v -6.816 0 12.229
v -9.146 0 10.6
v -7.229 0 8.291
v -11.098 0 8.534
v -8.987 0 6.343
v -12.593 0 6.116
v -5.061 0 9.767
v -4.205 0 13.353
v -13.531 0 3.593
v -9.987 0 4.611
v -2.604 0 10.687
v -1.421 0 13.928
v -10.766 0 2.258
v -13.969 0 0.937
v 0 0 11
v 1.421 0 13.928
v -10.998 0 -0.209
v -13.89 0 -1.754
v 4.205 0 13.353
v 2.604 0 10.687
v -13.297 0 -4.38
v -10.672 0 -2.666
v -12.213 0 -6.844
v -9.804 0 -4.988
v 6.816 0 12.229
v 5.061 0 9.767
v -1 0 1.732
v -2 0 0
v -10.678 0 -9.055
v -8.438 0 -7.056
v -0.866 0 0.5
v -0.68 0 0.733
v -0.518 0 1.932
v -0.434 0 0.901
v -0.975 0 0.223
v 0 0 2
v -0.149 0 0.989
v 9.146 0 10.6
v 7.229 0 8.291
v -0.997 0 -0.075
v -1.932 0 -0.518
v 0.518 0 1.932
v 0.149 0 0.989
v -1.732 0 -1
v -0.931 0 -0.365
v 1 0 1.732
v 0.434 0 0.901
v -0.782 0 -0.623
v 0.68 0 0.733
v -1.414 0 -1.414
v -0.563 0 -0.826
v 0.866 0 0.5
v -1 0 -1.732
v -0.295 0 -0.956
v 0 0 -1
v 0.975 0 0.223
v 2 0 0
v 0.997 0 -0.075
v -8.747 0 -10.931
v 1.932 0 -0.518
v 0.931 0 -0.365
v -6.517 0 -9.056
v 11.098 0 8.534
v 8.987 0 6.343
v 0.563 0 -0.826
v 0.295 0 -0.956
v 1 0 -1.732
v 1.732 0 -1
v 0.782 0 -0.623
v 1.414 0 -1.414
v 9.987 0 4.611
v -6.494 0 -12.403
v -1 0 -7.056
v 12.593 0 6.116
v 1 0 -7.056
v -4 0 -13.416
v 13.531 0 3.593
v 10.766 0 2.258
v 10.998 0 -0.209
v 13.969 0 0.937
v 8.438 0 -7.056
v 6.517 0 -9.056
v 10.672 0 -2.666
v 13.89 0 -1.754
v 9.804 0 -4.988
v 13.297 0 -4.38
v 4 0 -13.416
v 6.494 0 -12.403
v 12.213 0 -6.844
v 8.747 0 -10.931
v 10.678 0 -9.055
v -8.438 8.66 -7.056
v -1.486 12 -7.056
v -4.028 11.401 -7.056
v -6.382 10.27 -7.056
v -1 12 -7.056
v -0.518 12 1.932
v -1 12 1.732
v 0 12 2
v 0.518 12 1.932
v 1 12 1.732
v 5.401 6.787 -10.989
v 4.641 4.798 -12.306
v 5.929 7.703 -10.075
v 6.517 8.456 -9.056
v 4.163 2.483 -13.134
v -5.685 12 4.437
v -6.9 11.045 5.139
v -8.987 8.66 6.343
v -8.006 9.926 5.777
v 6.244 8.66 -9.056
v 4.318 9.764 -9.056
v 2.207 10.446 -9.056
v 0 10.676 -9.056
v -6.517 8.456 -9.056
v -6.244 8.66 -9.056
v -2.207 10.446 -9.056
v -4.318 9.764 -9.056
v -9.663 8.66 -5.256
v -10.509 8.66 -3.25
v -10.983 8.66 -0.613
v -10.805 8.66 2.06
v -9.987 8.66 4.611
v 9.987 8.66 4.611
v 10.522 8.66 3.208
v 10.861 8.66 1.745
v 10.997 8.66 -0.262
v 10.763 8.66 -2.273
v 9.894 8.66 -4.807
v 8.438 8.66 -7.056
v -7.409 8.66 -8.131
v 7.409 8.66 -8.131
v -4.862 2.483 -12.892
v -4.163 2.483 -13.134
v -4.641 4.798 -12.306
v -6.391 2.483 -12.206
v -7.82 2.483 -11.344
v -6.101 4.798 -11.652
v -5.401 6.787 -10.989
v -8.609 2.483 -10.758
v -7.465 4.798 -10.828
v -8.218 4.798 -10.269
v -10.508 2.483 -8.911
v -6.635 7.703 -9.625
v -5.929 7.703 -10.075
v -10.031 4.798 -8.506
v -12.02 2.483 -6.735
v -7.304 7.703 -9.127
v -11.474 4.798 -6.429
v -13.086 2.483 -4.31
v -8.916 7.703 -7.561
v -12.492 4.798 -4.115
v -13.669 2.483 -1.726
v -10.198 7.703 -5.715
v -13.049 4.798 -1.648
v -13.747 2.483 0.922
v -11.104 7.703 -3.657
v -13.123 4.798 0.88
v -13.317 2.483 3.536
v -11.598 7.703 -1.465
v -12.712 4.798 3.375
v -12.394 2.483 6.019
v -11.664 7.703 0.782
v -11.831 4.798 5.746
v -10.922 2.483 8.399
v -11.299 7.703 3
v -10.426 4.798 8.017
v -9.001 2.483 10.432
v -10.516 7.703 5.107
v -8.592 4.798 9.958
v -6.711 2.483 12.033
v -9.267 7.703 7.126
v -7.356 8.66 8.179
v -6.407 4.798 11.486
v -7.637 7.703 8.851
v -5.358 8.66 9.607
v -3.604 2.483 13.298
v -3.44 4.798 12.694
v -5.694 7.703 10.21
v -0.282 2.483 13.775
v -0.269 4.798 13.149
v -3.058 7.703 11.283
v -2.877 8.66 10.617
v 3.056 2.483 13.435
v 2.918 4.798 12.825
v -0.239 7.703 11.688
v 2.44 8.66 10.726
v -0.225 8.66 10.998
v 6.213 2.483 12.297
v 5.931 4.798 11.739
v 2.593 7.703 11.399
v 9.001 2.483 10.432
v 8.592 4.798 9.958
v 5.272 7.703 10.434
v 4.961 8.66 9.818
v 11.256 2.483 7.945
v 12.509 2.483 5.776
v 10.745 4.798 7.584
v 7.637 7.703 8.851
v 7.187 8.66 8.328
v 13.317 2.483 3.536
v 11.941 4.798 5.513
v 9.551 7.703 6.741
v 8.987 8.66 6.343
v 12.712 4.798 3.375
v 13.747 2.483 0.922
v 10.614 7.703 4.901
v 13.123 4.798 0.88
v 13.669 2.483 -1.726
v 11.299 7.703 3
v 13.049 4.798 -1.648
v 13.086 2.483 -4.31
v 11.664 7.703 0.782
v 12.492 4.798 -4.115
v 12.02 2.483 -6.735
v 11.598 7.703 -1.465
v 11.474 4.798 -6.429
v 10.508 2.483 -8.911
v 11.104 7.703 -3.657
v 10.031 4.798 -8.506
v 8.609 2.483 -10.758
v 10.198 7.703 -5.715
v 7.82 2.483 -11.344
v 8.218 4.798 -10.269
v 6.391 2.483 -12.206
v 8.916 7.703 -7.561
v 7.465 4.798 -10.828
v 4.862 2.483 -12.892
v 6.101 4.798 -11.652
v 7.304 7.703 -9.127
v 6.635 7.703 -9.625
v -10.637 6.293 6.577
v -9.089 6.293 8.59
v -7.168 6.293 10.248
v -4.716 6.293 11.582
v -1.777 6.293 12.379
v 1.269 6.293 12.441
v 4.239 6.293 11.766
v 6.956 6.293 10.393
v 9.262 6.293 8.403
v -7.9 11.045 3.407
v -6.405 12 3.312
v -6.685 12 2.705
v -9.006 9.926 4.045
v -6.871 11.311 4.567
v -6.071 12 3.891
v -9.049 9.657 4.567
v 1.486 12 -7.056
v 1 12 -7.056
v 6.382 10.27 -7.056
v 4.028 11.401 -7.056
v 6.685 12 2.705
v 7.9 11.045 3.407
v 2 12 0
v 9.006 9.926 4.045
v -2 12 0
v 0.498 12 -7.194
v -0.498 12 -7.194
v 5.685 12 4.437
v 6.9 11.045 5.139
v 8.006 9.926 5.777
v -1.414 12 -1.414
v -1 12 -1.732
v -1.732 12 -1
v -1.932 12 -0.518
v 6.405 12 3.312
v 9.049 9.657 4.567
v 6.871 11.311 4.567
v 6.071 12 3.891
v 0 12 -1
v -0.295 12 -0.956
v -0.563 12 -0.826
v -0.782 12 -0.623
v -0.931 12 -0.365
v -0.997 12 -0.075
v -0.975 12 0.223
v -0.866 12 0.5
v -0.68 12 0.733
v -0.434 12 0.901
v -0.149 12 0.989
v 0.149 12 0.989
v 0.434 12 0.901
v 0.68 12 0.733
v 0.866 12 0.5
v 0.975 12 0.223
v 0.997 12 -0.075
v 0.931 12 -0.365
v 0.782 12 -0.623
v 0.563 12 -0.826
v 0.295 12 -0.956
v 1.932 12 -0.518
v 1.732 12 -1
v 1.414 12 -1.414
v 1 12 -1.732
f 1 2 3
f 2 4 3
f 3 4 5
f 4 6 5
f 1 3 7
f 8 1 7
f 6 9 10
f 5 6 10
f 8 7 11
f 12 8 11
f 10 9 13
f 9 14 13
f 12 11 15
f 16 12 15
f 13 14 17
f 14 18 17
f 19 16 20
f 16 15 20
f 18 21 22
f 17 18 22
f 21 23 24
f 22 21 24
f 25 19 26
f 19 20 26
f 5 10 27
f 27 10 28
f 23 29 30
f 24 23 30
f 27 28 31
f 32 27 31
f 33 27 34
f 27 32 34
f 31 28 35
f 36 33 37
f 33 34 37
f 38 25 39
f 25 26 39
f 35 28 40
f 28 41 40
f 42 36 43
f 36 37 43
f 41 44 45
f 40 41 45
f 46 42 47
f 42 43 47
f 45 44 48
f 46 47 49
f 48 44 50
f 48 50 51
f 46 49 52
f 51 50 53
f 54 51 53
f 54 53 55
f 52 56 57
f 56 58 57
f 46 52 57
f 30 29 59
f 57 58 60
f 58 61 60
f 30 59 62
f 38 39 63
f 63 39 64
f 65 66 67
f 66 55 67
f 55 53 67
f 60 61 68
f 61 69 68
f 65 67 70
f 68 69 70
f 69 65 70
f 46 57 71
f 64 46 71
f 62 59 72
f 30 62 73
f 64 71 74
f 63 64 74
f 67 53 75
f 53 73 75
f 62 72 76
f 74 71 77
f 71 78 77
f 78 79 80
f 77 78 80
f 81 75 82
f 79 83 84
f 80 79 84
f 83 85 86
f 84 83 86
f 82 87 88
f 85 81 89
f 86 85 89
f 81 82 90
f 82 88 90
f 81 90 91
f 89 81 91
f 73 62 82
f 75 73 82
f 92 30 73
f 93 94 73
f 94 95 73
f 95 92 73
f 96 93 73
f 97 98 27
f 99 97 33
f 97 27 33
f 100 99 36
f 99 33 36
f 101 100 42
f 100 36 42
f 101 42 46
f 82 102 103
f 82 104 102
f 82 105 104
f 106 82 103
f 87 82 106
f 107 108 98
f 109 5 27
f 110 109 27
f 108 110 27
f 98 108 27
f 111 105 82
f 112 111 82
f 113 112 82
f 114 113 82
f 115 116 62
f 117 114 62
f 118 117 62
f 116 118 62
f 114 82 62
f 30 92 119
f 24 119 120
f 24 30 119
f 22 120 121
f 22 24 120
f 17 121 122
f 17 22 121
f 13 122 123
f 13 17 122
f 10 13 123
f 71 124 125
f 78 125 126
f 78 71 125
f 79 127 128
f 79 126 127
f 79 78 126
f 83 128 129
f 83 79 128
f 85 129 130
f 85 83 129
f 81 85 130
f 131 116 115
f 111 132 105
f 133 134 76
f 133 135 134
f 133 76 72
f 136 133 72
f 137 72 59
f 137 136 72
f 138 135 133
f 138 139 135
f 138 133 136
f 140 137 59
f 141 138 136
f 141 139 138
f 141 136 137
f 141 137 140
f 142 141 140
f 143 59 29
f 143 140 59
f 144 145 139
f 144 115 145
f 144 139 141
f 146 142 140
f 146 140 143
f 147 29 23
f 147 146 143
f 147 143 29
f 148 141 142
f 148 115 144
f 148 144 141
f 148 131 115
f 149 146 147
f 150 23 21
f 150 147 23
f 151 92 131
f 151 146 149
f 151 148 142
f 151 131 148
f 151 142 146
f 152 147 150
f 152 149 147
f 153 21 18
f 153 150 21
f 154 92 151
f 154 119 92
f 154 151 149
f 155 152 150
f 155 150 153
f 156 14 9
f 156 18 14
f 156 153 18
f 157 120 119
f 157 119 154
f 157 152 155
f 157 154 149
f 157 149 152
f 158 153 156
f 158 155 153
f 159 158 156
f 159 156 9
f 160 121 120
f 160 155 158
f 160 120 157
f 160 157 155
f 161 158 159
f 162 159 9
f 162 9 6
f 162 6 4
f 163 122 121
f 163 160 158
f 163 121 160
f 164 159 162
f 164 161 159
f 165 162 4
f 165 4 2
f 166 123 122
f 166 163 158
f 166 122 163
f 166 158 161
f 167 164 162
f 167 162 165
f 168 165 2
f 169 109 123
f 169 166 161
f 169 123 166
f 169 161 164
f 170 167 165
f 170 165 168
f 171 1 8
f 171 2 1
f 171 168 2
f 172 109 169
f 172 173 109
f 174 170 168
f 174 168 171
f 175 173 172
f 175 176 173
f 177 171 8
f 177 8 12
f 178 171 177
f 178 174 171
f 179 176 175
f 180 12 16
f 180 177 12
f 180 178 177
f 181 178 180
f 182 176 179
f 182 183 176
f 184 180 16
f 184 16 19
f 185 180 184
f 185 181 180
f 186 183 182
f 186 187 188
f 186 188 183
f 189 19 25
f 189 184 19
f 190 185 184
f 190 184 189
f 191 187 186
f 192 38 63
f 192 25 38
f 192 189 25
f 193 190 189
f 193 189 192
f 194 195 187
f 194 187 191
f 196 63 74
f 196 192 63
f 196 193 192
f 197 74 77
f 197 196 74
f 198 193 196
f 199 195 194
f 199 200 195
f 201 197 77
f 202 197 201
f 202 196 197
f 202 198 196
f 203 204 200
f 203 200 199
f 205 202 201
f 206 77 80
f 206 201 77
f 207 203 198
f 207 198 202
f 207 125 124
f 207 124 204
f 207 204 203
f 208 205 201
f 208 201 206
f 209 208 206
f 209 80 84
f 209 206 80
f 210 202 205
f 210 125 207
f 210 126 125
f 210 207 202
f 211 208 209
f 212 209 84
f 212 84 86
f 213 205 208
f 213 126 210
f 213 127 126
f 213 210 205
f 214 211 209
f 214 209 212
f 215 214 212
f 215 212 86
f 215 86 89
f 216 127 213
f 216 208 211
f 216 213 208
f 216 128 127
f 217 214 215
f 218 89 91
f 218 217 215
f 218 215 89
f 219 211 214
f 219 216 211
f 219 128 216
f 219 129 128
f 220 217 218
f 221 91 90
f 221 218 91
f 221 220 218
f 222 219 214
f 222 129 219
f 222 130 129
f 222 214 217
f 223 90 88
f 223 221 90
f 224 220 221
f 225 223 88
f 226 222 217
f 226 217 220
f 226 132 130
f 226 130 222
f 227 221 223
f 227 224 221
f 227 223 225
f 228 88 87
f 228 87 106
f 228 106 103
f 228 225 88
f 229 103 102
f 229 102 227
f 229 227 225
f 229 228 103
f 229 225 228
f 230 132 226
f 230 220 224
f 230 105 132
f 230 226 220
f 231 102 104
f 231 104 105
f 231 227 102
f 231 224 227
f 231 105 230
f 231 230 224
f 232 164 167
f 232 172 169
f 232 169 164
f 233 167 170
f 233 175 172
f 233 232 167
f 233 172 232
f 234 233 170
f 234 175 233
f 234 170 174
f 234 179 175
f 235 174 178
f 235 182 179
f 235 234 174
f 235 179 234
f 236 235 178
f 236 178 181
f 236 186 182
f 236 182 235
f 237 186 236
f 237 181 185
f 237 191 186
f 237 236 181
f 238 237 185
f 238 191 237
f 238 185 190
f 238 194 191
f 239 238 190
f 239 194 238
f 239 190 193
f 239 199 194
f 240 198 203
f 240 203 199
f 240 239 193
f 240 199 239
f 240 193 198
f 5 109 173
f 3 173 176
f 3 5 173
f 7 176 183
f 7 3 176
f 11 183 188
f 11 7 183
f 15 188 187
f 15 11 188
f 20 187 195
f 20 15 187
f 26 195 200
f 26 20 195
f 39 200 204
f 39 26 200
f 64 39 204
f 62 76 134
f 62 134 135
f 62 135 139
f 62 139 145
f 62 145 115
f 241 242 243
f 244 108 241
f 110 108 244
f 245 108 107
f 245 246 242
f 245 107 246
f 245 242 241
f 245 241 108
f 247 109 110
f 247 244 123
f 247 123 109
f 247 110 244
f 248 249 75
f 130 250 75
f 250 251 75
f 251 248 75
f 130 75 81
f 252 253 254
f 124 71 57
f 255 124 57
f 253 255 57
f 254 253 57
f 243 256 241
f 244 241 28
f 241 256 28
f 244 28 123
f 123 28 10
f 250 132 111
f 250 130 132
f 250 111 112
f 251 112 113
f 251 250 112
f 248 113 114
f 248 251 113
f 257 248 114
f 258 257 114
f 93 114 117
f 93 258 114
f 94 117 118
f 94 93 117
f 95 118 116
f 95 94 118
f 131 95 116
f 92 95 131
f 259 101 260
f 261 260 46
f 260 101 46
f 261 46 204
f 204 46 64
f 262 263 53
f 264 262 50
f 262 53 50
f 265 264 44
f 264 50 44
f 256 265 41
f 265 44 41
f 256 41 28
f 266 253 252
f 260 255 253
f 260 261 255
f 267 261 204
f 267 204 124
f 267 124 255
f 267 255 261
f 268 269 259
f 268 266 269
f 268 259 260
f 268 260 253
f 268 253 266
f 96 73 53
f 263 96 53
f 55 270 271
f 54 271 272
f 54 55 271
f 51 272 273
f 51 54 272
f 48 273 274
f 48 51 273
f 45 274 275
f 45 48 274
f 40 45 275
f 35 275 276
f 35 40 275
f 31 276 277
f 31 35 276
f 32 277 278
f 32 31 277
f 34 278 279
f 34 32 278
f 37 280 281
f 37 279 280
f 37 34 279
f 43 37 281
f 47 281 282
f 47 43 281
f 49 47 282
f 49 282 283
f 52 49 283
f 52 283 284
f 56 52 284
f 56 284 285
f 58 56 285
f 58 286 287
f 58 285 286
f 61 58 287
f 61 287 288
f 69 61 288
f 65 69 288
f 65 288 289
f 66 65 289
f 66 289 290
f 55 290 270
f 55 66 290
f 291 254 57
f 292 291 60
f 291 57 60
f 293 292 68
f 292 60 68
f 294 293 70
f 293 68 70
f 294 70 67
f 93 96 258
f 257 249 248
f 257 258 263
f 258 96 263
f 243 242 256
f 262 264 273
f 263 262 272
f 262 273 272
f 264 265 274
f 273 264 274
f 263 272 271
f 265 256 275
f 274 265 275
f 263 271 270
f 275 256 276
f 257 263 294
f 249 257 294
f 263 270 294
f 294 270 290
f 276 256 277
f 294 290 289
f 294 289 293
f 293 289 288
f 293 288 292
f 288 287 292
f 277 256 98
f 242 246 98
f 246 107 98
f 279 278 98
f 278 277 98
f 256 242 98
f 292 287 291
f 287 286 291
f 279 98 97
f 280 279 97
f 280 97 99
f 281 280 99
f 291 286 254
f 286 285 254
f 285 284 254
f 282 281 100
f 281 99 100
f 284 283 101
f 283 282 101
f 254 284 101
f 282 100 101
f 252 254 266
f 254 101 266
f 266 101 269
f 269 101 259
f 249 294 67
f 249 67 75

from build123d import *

# Parameters (mm, degrees)
SKETCH4_R                = 11
CUT_EXTRUDE4_DEPTH       = 25.248711
CUT_EXTRUDE5_DEPTH       = 22.610183
BOSS_EXTRUDE1_REACH      = 23.61
BOSS_EXTRUDE1_END_RADIUS = 14
SKETCH5_R                = 1
SKETCH7_W                = 20.713315
SKETCH7_H                = 3.375348
CUT_EXTRUDE6_DEPTH       = 25.228083
CUT_EXTRUDE6_DEPTH_BACK  = 25.228083


with BuildPart() as part:
    # Sketch1 → Revolve1 (revolve)
    with BuildSketch(Plane.XY):
        with BuildLine():
            Line((0, 14), (0, 0))
            Line((0, 0), (14, 0))
            ThreePointArc((14, 0), (9.899495, 9.899495), (0, 14))
        make_face()
    revolve(axis=Axis((0, -754.629412, 0), (0, 1, 0)))

    # Sketch4 → Cut-Extrude4 (cut, through all)
    with BuildSketch(Plane(origin=(0, 0, 0), x_dir=(1, 0, 0), z_dir=(0, 1, 0))):
        with Locations(Location((0, 0, 0), (0, 0, 90))):
            Circle(SKETCH4_R)
    extrude(amount=CUT_EXTRUDE4_DEPTH, mode=Mode.SUBTRACT)

    # Sketch6 → Cut-Extrude5 (cut, through all)
    with BuildSketch(Plane(origin=(0, 0, 0), x_dir=(1, 0, 0), z_dir=(0, 1, 0))):
        with BuildLine():
            Line((-6.517247, 9.056408), (6.517247, 9.056408))
            Line((6.517247, 9.056408), (4, 13.416408))
            ThreePointArc((4, 13.416408), (0, 14), (-4, 13.416408))
            Line((-4, 13.416408), (-6.517247, 9.056408))
        make_face()
    extrude(amount=CUT_EXTRUDE5_DEPTH, mode=Mode.SUBTRACT)

    # Boss-Extrude1: up to this sphere (the profile starts inside it)
    boss_extrude1_end = Location((0, 0, 0)) * Sphere(BOSS_EXTRUDE1_END_RADIUS, mode=Mode.PRIVATE)
    # Sketch5 → Boss-Extrude1 (add, up to the surface)
    with BuildSketch(Plane(origin=(0, 0, 0), x_dir=(1, 0, 0), z_dir=(0, 1, 0)), mode=Mode.PRIVATE) as boss_extrude1_sk1:
        with BuildLine():
            Line((-8.43843, 7.056408), (-1, 7.056408))
            Line((-1, 7.056408), (-1, 1.732051))
            ThreePointArc((-1, 1.732051), (-1.732051, 1), (-2, 0))
            Line((-2, 0), (-12.593387, -6.116095))
            Line((-12.593387, -6.116095), (-11.593387, -7.848145))
            Line((-11.593387, -7.848145), (-1, -1.732051))
            ThreePointArc((-1, -1.732051), (0, -2), (1, -1.732051))
            Line((1, -1.732051), (11.593387, -7.848145))
            Line((11.593387, -7.848145), (12.593387, -6.116095))
            Line((12.593387, -6.116095), (2, 0))
            ThreePointArc((2, 0), (1.732051, 1), (1, 1.732051))
            Line((1, 1.732051), (1, 7.056408))
            Line((1, 7.056408), (8.43843, 7.056408))
            Line((8.43843, 7.056408), (8.43843, 9.056408))
            Line((8.43843, 9.056408), (-8.43843, 9.056408))
            Line((-8.43843, 9.056408), (-8.43843, 7.056408))
        make_face()
        with Locations(Location((0, 0, 0), (0, 0, 90))):
            Circle(SKETCH5_R, mode=Mode.SUBTRACT)
    boss_extrude1_tool1 = extrude(boss_extrude1_sk1.sketch, amount=BOSS_EXTRUDE1_REACH, mode=Mode.PRIVATE) & boss_extrude1_end
    add(boss_extrude1_tool1.solids().sort_by_distance((0, 0, -1.246464))[0])

    # Sketch7 → Cut-Extrude6 (cut, two sides)
    with BuildSketch(Plane.XY) as cut_extrude6_sk:
        with Locations((0.377369, 13.687674)):
            Rectangle(SKETCH7_W, SKETCH7_H)
    extrude(amount=CUT_EXTRUDE6_DEPTH, mode=Mode.SUBTRACT)
    extrude(cut_extrude6_sk.sketch, amount=-CUT_EXTRUDE6_DEPTH_BACK, mode=Mode.SUBTRACT)


solid = part.part
